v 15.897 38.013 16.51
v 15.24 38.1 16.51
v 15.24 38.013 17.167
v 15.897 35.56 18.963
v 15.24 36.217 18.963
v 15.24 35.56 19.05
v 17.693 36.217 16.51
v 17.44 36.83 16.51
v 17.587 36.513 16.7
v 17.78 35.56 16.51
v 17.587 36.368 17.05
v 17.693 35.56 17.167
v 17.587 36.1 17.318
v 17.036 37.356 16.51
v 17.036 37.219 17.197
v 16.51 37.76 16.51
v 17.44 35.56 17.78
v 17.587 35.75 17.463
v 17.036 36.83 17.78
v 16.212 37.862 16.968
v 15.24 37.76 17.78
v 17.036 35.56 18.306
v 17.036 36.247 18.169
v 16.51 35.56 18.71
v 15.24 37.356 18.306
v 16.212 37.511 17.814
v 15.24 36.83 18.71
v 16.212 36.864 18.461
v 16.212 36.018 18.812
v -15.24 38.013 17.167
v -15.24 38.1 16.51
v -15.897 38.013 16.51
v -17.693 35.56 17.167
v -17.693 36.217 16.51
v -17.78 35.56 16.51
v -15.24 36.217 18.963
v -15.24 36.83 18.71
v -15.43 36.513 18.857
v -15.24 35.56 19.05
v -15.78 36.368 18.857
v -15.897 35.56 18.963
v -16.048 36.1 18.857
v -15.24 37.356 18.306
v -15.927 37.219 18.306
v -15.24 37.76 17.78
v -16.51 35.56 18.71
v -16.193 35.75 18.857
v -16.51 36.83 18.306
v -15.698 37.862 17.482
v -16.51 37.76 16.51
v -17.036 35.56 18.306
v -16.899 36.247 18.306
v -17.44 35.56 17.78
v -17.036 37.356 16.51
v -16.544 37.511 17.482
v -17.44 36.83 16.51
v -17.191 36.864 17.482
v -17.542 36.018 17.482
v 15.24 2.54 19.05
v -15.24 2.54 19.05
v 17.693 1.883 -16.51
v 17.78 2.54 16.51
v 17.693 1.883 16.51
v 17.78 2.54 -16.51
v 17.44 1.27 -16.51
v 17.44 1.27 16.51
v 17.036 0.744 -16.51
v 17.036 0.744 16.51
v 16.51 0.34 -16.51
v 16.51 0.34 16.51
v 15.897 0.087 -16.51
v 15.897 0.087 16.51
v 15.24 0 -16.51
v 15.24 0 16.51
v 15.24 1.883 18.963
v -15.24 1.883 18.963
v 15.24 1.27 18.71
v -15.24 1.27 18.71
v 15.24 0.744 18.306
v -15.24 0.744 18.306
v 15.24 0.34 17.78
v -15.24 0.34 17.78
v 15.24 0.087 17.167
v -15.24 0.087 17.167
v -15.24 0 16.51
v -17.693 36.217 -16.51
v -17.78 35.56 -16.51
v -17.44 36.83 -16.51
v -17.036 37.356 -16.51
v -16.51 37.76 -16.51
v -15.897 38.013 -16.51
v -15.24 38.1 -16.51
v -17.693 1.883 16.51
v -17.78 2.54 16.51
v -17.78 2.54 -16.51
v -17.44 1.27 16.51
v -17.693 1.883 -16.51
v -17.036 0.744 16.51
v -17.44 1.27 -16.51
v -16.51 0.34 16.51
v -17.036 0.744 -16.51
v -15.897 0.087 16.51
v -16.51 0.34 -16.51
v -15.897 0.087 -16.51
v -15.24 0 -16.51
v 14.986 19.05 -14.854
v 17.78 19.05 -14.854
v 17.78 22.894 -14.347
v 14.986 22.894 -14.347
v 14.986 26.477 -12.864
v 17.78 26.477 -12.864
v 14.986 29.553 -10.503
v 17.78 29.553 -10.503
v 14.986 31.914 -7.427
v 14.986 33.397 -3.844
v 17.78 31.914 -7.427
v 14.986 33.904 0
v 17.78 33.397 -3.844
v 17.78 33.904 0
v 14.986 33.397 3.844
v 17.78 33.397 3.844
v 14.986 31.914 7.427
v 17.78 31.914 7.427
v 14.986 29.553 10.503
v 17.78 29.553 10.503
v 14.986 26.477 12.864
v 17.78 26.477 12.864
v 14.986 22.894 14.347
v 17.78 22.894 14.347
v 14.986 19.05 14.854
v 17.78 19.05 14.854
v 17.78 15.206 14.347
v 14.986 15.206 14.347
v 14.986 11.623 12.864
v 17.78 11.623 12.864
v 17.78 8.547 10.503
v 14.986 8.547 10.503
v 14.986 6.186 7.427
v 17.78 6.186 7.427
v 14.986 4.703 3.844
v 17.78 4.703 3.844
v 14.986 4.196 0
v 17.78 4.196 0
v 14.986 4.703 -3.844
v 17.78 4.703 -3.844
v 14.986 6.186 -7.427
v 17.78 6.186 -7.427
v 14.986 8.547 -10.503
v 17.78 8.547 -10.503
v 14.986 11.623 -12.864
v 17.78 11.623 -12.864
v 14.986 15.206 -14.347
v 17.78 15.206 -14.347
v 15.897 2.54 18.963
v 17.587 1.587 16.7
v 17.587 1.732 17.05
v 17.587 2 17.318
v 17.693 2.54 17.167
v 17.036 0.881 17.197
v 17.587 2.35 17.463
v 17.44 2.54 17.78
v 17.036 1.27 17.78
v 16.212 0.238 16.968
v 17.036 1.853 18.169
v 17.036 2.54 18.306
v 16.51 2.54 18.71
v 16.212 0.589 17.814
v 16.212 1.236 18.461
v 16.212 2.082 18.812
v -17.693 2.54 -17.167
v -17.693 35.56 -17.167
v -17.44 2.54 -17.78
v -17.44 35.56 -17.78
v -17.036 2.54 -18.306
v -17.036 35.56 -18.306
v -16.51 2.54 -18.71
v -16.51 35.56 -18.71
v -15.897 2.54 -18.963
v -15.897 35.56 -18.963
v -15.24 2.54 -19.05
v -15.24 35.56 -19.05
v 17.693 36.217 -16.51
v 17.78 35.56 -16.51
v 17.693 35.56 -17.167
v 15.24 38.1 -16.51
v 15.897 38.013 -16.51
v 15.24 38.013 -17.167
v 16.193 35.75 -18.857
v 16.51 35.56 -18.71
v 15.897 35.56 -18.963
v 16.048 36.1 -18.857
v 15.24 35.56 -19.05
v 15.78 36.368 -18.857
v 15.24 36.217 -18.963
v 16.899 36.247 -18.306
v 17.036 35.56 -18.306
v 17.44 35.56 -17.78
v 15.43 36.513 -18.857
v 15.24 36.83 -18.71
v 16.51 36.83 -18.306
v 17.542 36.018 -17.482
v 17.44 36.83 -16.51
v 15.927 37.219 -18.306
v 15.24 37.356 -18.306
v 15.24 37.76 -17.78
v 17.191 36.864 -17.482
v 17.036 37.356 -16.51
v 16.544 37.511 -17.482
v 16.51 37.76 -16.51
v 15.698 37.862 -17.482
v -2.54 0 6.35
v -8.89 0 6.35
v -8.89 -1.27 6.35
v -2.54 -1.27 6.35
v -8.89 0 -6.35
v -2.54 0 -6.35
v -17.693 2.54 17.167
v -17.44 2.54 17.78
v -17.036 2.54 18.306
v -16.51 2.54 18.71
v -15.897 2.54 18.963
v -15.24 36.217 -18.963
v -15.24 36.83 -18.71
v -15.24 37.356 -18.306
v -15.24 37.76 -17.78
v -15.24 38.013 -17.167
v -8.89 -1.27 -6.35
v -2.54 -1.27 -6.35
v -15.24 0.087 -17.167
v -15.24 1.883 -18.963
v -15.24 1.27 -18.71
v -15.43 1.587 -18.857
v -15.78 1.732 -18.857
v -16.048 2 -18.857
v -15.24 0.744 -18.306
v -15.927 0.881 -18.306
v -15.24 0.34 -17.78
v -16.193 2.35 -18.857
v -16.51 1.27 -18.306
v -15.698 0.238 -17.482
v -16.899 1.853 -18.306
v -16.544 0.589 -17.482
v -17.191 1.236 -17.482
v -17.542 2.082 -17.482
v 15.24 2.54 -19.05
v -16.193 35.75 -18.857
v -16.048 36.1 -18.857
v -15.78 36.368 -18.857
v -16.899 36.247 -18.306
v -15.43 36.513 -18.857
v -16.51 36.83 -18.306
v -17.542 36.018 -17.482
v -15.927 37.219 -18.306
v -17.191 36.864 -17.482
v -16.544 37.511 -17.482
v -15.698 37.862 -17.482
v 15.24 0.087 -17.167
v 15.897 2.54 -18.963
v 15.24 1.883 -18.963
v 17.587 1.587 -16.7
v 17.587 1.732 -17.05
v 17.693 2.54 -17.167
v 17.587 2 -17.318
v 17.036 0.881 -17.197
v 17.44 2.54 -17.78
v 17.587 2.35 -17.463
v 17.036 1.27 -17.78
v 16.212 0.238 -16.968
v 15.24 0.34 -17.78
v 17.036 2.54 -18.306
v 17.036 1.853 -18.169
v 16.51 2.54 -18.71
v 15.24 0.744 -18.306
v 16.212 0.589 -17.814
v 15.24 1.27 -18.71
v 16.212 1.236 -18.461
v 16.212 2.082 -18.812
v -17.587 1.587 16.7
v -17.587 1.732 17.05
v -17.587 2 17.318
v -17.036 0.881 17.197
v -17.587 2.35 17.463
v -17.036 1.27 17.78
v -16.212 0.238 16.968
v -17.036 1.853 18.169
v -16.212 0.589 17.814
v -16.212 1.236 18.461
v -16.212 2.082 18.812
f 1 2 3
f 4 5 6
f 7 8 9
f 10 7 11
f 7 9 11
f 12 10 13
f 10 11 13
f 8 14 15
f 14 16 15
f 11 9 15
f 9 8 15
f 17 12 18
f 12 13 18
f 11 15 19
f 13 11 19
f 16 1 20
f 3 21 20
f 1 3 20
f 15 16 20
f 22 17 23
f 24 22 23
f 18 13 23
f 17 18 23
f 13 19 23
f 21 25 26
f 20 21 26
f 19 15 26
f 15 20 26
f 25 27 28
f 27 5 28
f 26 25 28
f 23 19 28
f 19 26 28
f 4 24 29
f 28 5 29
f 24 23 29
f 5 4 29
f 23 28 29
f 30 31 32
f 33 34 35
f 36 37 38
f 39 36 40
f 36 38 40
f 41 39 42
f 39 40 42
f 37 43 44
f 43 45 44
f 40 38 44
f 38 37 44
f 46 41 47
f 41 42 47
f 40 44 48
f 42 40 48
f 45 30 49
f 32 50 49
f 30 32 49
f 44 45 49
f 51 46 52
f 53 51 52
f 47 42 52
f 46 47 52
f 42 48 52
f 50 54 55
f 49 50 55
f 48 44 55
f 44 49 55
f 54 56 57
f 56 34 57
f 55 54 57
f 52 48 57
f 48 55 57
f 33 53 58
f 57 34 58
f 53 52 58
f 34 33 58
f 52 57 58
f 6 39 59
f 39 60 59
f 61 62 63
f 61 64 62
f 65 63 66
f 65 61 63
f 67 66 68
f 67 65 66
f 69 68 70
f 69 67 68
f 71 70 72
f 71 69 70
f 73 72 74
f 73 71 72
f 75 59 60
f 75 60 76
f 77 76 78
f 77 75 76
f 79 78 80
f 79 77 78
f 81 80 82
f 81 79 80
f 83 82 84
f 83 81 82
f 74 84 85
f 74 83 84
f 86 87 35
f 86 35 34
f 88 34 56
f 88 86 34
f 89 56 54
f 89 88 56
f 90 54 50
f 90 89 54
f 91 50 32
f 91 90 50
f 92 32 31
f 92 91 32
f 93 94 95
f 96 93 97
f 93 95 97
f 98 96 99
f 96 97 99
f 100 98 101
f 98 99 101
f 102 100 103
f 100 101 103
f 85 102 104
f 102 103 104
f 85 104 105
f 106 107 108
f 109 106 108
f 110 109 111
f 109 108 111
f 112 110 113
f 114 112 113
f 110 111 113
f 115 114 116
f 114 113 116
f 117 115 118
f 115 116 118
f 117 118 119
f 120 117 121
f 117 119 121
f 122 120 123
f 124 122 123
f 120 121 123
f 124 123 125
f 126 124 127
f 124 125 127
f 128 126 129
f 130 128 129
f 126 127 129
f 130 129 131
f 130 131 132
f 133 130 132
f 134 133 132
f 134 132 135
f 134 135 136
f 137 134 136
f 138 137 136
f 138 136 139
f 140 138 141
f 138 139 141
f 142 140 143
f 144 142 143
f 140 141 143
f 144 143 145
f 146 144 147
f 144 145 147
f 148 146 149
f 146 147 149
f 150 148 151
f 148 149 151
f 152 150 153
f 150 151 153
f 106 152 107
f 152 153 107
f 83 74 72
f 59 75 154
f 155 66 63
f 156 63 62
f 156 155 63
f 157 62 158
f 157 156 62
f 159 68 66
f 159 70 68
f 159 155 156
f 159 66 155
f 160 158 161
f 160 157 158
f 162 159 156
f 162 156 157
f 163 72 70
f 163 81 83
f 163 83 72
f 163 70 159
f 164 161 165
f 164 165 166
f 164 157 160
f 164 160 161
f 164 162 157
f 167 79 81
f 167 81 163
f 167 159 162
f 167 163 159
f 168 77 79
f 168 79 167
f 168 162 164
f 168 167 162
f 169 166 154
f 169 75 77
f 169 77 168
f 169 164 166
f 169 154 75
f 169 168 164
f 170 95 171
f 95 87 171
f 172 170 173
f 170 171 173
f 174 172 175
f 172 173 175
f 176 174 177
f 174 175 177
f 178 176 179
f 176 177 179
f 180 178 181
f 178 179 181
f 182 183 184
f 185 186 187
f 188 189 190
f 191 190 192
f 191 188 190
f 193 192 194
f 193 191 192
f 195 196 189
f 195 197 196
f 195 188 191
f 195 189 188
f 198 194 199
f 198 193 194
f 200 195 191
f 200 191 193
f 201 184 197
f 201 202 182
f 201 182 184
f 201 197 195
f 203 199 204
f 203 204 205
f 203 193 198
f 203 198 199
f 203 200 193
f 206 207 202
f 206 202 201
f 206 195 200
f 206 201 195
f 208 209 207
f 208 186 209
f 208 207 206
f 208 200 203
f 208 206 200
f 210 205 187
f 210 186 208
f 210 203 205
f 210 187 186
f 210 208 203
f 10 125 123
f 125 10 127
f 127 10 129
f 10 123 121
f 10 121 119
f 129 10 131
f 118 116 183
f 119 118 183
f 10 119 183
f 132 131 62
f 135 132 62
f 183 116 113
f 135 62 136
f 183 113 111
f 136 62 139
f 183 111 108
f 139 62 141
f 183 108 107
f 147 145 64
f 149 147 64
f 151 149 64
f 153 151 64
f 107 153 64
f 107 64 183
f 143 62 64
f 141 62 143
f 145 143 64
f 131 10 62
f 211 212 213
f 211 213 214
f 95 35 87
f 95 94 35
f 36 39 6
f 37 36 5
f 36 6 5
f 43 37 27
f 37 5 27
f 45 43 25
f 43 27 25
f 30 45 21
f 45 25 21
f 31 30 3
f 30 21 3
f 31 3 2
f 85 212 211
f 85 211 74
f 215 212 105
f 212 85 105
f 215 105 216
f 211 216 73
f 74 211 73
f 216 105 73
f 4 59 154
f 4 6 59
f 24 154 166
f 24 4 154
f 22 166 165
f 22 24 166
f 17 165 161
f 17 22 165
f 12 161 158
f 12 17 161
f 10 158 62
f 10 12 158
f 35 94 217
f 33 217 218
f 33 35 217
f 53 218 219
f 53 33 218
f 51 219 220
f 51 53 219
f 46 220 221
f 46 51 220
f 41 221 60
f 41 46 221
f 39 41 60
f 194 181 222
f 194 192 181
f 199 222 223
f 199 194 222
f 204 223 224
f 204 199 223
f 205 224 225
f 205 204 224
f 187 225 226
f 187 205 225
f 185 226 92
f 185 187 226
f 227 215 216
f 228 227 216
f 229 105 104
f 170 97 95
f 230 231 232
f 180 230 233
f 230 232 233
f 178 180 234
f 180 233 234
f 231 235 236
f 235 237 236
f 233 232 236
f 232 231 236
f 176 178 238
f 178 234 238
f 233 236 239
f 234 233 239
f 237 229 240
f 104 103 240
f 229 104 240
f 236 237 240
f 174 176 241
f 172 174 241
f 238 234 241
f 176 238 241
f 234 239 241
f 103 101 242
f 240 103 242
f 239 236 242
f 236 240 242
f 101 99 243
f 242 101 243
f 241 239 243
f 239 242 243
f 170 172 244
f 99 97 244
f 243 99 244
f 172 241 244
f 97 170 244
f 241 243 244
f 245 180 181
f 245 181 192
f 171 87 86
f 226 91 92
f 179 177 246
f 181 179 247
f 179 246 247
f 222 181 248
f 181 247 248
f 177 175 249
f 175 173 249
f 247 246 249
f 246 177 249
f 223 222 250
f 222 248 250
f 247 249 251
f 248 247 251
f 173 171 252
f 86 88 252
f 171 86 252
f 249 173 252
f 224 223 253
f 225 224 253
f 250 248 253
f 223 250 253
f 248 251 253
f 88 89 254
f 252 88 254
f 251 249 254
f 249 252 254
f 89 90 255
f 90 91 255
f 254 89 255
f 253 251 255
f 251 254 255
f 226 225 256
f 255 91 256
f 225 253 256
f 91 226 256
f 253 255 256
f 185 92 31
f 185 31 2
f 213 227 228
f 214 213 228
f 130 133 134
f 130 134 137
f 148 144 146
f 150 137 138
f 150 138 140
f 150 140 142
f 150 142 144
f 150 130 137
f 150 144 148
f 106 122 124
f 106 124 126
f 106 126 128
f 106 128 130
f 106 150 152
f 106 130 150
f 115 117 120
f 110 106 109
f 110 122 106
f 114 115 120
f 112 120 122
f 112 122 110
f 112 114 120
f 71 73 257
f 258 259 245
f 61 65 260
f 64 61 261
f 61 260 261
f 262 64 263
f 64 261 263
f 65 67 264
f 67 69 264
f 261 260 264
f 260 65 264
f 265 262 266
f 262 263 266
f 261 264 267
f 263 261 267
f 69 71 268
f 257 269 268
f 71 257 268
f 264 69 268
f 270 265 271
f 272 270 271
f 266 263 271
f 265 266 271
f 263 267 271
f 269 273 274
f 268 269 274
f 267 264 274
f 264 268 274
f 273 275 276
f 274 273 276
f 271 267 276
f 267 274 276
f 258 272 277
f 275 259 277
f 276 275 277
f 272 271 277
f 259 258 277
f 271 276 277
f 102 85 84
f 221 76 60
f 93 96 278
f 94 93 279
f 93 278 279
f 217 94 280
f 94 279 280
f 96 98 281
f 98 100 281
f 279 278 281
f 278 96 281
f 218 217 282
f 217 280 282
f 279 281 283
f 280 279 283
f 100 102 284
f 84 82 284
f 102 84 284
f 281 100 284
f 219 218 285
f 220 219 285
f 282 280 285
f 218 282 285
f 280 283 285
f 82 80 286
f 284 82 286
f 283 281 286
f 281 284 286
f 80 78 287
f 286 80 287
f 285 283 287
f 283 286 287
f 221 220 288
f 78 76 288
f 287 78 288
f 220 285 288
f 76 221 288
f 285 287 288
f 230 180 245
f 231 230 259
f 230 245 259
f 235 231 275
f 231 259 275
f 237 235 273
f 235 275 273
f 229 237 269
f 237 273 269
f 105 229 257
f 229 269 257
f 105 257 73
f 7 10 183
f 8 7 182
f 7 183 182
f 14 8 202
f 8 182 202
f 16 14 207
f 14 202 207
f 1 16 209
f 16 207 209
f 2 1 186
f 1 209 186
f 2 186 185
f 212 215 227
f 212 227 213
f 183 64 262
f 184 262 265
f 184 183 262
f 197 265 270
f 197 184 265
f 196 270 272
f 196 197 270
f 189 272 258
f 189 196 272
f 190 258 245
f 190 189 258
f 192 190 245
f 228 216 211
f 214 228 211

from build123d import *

# Parameters (mm, degrees)
SKETCH1_W           = 35.56
SKETCH1_H           = 38.1
BOSS_EXTRUDE1_DEPTH = 38.1
FILLET1_R           = 2.54
SKETCH4_R           = 14.853609937
CUT_EXTRUDE2_DEPTH  = 2.794
SKETCH5_W           = 6.35
SKETCH5_H           = 12.7
BOSS_EXTRUDE2_DEPTH = 1.27


with BuildPart() as part:
    # Sketch1 → Boss-Extrude1 (new body)
    with BuildSketch(Plane(origin=(0, 0, 0), x_dir=(1, 0, 0), z_dir=(0, 1, 0))):
        Rectangle(SKETCH1_W, SKETCH1_H)
    extrude(amount=BOSS_EXTRUDE1_DEPTH)

    # Fillet1
    fillet1_edges = [part.edges().sort_by_distance(p)[0] for p in [
        (-17.78, 38.1, 0),
        (0, 38.1, 19.05),
        (17.78, 38.1, 0),
        (0, 0, 19.05),
        (-17.78, 0, 0),
        (0, 0, -19.05),
        (17.78, 0, 0),
        (17.78, 19.05, 19.05),
        (-17.78, 19.05, 19.05),
        (-17.78, 19.05, -19.05),
        (17.78, 19.05, -19.05),
        (0, 38.1, -19.05),
    ]]
    fillet(fillet1_edges, radius=FILLET1_R)

    # Sketch4 → Cut-Extrude2 (cut)
    with BuildSketch(Plane(origin=(17.78, 0, 0), x_dir=(0, 0, -1), z_dir=(1, 0, 0))):
        with Locations((0, 19.05)):
            Circle(SKETCH4_R)
    extrude(amount=-CUT_EXTRUDE2_DEPTH, mode=Mode.SUBTRACT)

    # Sketch5 → Boss-Extrude2 (add)
    with BuildSketch(Plane.XZ):
        with Locations((-5.715, 0)):
            Rectangle(SKETCH5_W, SKETCH5_H)
    extrude(amount=BOSS_EXTRUDE2_DEPTH)


solid = part.part
